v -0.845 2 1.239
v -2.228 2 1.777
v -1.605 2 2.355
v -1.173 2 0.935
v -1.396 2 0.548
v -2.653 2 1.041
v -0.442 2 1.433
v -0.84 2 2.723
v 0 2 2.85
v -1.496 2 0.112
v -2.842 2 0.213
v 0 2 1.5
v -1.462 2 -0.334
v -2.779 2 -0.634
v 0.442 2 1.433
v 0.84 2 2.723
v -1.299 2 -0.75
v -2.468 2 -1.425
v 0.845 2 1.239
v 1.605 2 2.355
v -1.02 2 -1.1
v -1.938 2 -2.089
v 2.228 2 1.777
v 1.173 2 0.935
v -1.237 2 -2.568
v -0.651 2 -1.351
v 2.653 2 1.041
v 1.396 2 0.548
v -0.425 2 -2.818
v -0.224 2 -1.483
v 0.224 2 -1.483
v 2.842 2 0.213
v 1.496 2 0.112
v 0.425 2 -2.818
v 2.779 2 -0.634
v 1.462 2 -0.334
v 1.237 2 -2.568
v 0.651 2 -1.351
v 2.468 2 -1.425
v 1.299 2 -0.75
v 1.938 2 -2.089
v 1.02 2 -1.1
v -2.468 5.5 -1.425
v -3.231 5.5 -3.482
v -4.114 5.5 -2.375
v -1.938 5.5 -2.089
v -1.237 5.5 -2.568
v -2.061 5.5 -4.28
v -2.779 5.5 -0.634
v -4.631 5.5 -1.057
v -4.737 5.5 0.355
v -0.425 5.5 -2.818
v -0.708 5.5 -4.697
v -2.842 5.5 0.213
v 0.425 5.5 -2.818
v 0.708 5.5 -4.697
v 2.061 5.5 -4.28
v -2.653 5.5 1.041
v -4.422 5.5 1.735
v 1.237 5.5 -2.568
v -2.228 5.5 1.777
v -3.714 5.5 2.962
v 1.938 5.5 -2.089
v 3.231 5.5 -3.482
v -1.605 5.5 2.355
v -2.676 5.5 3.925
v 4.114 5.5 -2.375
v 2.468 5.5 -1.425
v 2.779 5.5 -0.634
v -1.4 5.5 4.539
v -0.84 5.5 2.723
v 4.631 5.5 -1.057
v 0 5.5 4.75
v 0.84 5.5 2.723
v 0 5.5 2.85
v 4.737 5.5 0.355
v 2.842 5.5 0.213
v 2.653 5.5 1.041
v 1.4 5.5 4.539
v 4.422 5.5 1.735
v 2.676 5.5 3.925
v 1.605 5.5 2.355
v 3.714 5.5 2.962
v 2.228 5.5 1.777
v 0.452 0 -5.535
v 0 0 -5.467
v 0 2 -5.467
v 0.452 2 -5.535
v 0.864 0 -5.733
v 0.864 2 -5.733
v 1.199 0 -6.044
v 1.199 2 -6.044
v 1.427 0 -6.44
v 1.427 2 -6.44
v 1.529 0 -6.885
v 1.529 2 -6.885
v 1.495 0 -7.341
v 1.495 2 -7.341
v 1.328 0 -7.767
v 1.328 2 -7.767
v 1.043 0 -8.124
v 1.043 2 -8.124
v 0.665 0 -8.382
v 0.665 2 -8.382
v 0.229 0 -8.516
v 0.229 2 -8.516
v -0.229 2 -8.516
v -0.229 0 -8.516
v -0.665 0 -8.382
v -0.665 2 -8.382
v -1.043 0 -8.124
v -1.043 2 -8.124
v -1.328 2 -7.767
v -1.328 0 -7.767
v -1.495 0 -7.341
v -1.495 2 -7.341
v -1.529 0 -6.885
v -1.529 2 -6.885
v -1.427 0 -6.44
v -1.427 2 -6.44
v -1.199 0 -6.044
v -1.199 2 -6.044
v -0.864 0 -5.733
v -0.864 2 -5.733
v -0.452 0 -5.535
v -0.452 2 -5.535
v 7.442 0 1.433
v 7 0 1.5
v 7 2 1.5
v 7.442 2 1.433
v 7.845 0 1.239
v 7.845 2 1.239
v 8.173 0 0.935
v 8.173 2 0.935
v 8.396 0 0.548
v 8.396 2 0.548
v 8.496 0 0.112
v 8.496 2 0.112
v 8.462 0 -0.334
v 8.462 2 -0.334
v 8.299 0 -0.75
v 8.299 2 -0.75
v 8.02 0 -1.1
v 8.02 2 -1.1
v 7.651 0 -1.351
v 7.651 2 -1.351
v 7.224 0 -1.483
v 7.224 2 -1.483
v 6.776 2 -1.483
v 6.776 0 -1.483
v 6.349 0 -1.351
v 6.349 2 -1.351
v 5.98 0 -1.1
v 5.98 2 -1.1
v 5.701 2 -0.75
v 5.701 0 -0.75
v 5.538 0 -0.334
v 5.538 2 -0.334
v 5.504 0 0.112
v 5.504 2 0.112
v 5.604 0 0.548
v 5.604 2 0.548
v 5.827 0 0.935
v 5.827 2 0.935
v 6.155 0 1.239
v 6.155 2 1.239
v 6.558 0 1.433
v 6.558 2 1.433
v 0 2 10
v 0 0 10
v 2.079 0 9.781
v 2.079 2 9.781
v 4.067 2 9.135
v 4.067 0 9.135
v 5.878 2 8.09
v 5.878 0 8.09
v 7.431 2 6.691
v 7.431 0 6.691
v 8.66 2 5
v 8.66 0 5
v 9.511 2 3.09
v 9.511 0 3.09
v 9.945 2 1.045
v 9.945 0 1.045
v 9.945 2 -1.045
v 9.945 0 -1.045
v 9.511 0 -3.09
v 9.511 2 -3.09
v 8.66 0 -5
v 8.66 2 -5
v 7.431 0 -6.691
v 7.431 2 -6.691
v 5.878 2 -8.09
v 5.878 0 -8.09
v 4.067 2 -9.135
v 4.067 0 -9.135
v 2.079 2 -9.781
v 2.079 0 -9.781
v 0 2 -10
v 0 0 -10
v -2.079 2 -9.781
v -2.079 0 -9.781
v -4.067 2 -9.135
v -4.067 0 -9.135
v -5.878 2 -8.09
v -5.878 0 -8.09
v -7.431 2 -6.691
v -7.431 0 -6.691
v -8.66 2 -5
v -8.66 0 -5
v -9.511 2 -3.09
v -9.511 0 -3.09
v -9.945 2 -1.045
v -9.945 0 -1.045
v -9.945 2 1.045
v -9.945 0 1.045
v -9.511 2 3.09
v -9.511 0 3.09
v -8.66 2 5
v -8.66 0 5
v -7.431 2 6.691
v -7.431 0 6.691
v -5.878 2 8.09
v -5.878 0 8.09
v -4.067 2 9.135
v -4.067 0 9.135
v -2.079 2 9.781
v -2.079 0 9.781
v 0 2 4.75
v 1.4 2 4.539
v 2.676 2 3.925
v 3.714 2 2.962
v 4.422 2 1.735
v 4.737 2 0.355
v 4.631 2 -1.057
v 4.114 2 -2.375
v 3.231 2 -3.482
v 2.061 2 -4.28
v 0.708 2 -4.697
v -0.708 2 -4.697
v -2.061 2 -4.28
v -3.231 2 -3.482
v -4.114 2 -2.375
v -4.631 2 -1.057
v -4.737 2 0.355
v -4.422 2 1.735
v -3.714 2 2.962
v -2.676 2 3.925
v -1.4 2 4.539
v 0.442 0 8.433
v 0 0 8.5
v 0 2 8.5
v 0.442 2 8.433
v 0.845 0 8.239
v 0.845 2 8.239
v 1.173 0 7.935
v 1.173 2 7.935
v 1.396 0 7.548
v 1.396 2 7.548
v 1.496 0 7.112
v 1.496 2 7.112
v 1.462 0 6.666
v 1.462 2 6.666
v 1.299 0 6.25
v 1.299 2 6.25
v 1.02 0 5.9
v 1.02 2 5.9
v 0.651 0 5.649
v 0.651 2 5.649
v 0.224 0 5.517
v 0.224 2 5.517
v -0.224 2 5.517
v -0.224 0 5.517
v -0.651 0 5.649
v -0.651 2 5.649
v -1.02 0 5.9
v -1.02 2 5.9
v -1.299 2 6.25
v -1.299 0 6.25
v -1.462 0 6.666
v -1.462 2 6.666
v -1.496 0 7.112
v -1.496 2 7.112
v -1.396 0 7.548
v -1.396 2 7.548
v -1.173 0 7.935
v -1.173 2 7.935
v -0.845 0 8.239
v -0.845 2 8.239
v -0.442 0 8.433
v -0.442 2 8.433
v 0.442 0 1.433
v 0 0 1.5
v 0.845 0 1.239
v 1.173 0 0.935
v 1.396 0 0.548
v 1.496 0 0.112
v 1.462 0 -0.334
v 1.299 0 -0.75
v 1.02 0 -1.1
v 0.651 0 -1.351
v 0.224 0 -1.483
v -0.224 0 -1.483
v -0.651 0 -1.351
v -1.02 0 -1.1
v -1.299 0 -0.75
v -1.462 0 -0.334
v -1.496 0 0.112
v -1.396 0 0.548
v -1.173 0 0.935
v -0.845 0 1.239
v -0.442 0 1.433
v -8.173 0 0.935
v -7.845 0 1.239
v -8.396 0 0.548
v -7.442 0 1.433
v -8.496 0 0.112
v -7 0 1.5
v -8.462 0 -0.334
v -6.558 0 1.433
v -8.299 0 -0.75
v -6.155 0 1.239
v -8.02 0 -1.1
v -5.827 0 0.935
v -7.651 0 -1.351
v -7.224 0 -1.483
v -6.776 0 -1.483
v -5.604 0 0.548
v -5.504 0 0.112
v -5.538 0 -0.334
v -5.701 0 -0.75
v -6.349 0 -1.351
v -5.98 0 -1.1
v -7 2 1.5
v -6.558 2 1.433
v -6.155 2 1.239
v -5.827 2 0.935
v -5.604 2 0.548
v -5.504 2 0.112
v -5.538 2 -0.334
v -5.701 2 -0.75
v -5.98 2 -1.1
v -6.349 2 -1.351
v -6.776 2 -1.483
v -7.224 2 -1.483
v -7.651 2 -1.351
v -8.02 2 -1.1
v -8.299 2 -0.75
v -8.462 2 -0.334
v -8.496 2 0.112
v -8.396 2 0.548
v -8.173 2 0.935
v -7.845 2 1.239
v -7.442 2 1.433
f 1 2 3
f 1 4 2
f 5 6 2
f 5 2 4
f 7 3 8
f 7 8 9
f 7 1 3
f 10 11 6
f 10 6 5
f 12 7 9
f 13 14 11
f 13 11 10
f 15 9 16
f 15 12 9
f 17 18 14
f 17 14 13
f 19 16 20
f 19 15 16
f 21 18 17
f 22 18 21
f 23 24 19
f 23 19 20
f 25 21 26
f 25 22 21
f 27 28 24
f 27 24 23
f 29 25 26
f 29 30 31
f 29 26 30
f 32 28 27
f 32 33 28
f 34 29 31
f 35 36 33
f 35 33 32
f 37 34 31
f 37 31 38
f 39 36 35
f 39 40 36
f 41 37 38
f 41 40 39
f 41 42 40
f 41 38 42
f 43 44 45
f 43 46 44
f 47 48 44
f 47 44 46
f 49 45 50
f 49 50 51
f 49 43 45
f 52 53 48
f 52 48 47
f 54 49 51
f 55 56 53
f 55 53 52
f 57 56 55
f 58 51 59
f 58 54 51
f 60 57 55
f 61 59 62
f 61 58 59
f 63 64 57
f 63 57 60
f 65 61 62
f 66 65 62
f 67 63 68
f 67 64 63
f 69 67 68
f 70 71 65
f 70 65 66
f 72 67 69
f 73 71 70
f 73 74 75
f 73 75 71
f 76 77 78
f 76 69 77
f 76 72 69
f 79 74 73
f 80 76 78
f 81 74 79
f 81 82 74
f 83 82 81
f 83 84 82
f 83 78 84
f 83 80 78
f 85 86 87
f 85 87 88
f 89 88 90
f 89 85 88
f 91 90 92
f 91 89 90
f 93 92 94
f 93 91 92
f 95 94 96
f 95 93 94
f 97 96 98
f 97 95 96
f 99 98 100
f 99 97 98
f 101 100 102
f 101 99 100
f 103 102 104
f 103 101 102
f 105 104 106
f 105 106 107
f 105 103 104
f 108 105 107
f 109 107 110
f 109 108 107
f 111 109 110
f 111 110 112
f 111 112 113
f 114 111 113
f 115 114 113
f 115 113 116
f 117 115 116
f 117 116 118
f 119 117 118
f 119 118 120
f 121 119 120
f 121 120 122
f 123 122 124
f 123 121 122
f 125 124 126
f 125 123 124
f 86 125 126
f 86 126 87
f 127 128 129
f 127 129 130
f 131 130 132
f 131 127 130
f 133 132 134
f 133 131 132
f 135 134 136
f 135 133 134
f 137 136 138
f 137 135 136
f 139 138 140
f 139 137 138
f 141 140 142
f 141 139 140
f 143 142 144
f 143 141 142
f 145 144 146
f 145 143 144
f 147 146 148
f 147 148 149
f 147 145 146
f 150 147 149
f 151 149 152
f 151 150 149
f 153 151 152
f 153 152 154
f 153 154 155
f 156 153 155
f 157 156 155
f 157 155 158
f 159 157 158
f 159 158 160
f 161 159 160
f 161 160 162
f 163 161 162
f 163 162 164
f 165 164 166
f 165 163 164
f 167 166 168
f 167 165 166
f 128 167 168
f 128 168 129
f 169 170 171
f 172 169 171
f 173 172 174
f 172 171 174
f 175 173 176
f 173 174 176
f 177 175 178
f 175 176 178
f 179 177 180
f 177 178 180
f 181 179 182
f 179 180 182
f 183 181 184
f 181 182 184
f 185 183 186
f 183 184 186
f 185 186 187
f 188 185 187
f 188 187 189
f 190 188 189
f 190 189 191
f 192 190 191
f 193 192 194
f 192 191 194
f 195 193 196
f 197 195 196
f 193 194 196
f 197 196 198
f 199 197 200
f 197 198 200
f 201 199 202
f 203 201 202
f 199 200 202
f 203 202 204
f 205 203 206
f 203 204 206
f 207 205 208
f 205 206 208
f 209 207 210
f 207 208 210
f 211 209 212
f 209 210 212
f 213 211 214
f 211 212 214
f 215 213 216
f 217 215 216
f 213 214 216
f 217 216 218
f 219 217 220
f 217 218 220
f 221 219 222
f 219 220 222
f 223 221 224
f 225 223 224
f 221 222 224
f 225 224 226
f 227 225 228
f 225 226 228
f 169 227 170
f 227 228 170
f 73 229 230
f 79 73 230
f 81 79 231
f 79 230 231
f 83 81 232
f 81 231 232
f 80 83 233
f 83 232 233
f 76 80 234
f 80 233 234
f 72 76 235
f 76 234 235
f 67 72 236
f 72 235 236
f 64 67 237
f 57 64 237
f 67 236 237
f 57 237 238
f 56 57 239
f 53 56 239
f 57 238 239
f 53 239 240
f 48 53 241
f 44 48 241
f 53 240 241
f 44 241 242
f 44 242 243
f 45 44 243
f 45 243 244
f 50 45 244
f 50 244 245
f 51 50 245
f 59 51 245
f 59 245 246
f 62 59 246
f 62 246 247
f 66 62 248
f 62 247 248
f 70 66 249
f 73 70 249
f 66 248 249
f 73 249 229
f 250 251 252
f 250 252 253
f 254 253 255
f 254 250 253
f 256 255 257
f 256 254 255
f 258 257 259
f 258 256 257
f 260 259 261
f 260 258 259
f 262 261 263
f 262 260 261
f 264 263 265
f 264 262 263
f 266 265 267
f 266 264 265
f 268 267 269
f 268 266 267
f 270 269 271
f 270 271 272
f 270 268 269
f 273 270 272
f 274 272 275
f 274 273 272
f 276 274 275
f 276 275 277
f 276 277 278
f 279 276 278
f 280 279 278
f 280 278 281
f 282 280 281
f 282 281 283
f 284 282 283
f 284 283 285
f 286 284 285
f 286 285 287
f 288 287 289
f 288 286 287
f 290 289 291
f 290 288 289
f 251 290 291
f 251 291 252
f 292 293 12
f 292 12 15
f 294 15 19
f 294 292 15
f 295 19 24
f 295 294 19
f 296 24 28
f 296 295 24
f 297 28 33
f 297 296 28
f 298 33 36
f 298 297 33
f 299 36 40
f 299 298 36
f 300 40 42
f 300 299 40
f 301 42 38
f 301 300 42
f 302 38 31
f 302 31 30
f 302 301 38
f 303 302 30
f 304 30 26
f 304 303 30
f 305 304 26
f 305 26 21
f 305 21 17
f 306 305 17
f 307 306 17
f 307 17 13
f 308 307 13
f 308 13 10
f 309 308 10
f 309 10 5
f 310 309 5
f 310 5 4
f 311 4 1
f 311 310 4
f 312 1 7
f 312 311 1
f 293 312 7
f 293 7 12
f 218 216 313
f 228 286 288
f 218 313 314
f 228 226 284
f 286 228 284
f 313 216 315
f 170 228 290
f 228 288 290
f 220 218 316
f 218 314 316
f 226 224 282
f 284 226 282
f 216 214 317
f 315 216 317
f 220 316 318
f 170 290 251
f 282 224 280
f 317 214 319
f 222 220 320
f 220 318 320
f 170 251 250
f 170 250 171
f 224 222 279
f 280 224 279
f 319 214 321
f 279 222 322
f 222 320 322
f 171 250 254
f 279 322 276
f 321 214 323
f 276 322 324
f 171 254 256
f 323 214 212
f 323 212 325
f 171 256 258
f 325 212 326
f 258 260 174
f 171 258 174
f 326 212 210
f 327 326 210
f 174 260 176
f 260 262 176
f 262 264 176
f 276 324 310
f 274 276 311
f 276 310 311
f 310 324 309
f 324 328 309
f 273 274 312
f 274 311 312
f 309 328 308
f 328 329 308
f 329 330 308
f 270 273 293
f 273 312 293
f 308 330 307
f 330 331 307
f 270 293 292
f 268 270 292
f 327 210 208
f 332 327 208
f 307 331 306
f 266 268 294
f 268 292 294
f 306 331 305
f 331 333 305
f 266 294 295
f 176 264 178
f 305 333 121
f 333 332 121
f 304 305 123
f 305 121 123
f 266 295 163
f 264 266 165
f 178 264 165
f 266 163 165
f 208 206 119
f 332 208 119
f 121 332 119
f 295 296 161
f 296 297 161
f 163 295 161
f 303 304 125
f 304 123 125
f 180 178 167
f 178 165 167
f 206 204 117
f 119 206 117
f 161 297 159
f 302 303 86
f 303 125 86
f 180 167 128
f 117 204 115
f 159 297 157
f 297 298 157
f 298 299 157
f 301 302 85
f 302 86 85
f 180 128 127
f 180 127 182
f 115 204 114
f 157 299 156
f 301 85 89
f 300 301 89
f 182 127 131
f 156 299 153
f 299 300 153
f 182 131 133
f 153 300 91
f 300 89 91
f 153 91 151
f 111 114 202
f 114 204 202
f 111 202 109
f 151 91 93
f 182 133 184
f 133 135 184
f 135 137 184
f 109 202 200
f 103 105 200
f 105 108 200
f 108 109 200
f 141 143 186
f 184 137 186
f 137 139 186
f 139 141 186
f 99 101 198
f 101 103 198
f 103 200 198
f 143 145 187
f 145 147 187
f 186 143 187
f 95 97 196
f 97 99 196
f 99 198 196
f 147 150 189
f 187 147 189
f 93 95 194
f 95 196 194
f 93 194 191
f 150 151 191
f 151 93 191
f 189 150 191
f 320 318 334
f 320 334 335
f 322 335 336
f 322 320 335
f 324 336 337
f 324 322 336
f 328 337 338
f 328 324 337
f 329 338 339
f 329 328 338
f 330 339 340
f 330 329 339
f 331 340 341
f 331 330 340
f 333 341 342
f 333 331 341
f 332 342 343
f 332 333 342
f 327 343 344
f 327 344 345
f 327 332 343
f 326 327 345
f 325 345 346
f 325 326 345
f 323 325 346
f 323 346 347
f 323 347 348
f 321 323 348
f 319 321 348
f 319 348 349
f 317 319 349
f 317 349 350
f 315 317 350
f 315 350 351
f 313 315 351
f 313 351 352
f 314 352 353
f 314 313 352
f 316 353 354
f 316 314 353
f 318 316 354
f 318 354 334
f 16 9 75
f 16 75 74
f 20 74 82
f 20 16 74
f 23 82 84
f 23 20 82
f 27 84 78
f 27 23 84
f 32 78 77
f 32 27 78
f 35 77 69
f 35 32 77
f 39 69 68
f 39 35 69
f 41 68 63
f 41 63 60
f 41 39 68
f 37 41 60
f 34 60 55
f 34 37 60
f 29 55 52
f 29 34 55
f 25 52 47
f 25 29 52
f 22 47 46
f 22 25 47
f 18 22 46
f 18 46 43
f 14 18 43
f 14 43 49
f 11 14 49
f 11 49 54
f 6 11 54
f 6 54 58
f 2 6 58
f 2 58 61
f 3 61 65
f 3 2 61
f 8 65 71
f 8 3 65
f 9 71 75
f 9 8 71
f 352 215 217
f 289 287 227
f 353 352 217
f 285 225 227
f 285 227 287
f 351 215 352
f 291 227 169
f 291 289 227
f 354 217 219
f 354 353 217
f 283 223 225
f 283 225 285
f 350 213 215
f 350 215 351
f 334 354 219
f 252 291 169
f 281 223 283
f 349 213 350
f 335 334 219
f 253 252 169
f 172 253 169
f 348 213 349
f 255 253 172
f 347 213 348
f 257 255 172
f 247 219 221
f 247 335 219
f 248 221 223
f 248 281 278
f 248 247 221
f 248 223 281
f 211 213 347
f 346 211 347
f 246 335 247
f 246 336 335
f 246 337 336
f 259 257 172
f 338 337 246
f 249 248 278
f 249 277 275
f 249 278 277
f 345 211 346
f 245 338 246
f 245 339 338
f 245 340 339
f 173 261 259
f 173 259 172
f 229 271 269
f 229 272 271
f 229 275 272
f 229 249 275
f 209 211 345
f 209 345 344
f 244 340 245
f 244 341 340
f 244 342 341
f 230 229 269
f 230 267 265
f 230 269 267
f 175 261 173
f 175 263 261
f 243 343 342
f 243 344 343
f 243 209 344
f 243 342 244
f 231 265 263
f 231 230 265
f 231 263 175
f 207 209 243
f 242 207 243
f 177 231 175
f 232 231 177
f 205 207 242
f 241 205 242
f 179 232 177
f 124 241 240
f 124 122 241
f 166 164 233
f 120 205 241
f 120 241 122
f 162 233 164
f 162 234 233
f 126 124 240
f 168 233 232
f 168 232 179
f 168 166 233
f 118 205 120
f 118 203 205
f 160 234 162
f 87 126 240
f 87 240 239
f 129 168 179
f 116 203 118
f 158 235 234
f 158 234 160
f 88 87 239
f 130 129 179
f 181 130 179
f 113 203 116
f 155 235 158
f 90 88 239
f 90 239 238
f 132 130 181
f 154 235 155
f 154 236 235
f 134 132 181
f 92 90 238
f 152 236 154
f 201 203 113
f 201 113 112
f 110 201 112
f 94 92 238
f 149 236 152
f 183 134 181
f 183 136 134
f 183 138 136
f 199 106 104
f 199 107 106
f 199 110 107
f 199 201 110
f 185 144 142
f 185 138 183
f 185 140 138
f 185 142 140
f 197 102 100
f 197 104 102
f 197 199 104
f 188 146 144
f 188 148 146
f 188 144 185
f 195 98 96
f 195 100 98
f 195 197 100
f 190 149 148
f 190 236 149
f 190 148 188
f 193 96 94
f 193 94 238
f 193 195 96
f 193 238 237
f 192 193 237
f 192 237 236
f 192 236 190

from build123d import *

# Parameters (mm, degrees)
CROQUIS1_R              = 10
CROQUIS1_R_2            = 1.5
CROQUIS1_R_3            = 1.533499393
CROQUIS1_R_4            = 2.75
SALIENTE_EXTRUIR1_DEPTH = 2
CROQUIS2_R              = 4.75
CROQUIS2_R_2            = 2.85
SALIENTE_EXTRUIR2_DEPTH = 3.5


with BuildPart() as part:
    # Croquis1 → Saliente-Extruir1 (new body)
    # profile 1 of 2: a face of its own
    with BuildSketch(Plane(origin=(0, 0, 0), x_dir=(1, 0, 0), z_dir=(0, 1, 0))):
        with Locations(Location((0, 0, 0), (0, 0, 270))):
            Circle(CROQUIS1_R)
        with Locations(Location((-7, 0, 0), (0, 0, 270))):
            Circle(CROQUIS1_R_2, mode=Mode.SUBTRACT)
        with Locations(Location((0, -7, 0), (0, 0, 270))):
            Circle(CROQUIS1_R_2, mode=Mode.SUBTRACT)
        with Locations(Location((7, 0, 0), (0, 0, 270))):
            Circle(CROQUIS1_R_2, mode=Mode.SUBTRACT)
        with Locations(Location((0, 7, 0), (0, 0, 270))):
            Circle(CROQUIS1_R_3, mode=Mode.SUBTRACT)
        Circle(CROQUIS1_R_4, mode=Mode.SUBTRACT)
    # profile 2 of 2: a face of its own
    with BuildSketch(Plane(origin=(0, 0, 0), x_dir=(1, 0, 0), z_dir=(0, 1, 0))):
        Circle(CROQUIS1_R_4)
        with Locations(Location((0, 0, 0), (0, 0, 270))):
            Circle(CROQUIS1_R_2, mode=Mode.SUBTRACT)
    extrude(amount=SALIENTE_EXTRUIR1_DEPTH)

    # Croquis2 → Saliente-Extruir2 (add)
    with BuildSketch(Plane(origin=(0, 2, 0), x_dir=(1, 0, 0), z_dir=(0, 1, 0))):
        with Locations(Location((0, 0, 0), (0, 0, 270))):
            Circle(CROQUIS2_R)
        with Locations(Location((0, 0, 0), (0, 0, 270))):
            Circle(CROQUIS2_R_2, mode=Mode.SUBTRACT)
    extrude(amount=SALIENTE_EXTRUIR2_DEPTH)


solid = part.part
